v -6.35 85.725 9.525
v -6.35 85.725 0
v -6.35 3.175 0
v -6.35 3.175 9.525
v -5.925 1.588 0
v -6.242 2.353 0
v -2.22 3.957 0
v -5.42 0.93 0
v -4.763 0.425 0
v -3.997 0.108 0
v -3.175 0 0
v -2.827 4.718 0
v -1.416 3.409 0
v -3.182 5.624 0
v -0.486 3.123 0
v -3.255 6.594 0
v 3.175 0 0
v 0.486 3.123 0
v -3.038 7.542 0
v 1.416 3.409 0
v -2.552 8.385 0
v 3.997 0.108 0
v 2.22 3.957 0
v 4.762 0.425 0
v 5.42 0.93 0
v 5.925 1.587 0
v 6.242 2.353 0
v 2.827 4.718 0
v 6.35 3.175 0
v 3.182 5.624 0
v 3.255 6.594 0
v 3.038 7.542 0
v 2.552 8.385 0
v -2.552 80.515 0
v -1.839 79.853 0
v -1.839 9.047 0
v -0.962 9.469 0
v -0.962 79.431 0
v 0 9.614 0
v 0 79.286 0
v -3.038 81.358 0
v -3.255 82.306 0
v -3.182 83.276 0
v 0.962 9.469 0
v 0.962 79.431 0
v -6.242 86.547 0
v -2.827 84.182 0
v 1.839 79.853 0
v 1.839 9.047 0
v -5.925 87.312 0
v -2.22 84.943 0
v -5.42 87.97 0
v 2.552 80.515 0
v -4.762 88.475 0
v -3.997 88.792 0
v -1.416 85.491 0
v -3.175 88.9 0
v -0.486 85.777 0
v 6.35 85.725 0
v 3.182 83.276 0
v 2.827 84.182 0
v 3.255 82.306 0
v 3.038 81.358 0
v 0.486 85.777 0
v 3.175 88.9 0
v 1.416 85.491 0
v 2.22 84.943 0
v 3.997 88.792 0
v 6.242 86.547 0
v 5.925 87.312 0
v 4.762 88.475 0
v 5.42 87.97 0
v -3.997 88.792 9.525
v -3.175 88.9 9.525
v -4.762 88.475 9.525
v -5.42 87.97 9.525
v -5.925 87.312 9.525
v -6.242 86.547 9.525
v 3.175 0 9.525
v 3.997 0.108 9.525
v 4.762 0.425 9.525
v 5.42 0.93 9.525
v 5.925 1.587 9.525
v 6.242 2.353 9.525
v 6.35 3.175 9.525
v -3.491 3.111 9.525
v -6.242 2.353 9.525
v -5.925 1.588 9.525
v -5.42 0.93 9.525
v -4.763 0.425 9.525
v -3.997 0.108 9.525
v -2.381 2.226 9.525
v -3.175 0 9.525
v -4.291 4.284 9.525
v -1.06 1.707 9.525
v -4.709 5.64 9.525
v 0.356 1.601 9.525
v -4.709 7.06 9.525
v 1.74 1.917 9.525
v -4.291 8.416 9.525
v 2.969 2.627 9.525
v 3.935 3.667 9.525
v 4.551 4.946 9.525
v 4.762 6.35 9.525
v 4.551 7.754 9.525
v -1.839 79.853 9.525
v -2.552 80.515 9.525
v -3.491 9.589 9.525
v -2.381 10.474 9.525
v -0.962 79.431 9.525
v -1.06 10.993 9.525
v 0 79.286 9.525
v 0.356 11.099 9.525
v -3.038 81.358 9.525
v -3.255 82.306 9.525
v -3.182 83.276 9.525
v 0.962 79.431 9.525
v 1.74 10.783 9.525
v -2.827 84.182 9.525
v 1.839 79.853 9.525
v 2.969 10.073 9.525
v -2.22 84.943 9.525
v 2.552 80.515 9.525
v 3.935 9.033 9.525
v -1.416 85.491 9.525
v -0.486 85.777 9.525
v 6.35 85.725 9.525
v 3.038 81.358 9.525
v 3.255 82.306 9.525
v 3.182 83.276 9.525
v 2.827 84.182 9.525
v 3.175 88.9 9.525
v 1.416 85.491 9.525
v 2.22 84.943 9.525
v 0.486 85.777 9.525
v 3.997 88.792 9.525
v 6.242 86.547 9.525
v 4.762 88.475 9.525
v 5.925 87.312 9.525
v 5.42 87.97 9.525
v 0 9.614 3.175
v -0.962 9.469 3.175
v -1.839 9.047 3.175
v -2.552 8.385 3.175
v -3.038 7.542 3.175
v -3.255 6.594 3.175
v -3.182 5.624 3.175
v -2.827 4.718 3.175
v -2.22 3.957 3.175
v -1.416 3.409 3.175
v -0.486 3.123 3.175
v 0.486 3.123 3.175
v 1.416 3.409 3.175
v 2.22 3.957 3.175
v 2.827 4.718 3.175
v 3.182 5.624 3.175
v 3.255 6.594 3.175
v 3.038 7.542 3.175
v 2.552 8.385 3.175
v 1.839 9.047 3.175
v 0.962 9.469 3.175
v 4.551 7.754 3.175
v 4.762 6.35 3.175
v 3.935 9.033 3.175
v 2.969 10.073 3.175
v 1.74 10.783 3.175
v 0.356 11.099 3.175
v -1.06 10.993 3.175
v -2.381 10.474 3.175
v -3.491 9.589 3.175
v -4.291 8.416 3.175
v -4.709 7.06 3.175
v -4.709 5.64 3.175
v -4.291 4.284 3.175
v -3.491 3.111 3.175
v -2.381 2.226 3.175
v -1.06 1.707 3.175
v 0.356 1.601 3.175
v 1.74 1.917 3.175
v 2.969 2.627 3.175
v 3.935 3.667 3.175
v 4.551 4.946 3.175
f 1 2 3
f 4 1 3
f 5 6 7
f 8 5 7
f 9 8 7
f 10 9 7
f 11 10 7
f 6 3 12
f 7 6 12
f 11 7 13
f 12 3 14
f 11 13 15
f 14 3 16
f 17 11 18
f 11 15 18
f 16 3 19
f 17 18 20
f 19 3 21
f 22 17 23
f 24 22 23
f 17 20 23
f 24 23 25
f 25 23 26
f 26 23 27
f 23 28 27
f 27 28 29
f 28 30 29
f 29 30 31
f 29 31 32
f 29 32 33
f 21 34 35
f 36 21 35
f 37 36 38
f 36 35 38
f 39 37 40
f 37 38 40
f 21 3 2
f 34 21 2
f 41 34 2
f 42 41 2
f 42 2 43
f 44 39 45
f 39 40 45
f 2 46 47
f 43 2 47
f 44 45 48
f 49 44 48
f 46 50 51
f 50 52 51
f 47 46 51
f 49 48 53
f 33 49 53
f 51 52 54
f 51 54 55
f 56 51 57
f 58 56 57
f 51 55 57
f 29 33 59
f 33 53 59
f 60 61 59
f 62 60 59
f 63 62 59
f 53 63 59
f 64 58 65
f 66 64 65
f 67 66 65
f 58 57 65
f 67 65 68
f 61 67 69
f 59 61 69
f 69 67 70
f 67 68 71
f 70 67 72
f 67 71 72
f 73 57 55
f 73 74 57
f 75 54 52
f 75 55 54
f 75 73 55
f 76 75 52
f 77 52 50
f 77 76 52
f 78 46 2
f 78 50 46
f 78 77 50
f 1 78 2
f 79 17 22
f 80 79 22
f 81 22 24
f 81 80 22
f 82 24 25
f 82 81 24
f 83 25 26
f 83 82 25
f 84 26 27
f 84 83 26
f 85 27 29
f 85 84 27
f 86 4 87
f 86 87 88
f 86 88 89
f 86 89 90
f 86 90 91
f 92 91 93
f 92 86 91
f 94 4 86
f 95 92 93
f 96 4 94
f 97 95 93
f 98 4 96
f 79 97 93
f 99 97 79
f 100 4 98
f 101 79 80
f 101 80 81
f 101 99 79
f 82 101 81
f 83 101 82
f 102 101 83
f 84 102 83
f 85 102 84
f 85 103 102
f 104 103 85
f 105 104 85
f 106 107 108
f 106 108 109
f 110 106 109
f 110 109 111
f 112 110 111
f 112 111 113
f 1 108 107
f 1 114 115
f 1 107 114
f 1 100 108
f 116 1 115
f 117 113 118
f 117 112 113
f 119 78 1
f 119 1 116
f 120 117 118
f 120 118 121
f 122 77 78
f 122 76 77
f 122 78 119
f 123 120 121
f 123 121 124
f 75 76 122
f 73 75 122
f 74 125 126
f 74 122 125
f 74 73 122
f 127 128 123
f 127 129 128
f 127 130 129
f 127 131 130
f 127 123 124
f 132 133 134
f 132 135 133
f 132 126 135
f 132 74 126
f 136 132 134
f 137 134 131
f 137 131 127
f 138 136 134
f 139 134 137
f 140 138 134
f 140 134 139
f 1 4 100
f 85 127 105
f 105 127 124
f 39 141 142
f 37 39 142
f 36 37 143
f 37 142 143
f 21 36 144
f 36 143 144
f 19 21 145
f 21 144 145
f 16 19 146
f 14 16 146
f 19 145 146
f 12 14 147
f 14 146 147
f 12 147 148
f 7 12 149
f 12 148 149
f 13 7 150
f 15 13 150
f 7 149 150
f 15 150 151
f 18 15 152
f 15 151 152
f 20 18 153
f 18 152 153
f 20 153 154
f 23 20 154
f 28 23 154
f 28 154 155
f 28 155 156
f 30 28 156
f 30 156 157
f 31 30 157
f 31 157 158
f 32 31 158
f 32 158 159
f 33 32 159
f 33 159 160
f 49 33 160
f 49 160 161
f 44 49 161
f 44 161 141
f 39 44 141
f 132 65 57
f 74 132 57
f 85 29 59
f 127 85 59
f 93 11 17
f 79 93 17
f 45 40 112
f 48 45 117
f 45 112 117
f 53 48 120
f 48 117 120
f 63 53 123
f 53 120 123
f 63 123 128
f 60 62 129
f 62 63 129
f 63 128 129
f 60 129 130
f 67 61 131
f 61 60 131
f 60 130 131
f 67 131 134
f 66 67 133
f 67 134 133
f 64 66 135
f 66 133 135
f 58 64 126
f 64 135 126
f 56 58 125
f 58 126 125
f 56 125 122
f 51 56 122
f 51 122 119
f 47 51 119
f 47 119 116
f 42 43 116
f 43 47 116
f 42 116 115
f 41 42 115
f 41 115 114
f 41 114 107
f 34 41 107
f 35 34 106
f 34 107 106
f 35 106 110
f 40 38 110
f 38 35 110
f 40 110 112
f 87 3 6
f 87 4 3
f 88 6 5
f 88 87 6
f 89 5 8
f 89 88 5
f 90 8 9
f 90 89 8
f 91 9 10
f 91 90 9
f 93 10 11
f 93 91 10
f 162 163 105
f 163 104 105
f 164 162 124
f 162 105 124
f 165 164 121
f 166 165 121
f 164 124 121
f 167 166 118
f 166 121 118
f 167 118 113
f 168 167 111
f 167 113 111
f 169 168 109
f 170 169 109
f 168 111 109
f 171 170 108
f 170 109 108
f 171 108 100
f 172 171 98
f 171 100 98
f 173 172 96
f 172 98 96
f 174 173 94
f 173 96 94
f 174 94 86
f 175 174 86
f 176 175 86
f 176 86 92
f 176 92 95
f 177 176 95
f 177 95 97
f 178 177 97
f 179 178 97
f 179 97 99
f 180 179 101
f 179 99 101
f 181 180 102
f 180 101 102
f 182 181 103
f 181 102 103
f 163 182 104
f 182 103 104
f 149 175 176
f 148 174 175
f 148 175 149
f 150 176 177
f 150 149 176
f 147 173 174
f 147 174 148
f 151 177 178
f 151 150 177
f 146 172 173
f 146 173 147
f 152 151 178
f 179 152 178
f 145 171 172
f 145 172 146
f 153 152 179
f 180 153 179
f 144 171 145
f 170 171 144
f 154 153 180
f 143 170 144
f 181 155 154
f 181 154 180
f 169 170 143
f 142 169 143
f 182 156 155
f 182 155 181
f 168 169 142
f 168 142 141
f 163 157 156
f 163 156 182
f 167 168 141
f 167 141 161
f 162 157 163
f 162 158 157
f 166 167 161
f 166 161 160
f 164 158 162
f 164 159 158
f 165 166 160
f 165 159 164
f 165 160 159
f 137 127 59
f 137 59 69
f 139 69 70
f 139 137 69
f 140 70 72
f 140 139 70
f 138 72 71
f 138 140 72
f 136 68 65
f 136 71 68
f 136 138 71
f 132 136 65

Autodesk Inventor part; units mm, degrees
ref_plane "YZ Plane" through (0, 0, 0) normal (1, 0, 0) x (0, 1, 0)
ref_plane "XZ Plane" through (0, 0, 0) normal (0, 1, 0) x (-1, 0, 0)
sketch "Sketch1" plane through (0, 0, 0) normal (0, 0, 1) x (1, 0, 0)
  line L0 (-6.35, 0) -> (6.35, 0)
  line L1 (6.35, 0) -> (6.35, 88.9)
  line L2 (6.35, 88.9) -> (-6.35, 88.9)
  line L3 (-6.35, 88.9) -> (-6.35, 0)
  point P0 (0, 0)
  dimension "d6" = 88.9
  dimension "d7" = 12.7
  dimension "d22" = 6.35
extrude "Extrusion3" add sketch "Sketch1" along normal blind 9.525
sketch "Sketch4" plane through (0, 0, 0) normal (0, 0, -1) x (-1, 0, 0)
  line L0 (6.35, 0) -> (-6.35, 0) projected
  line L1 (-6.35, 0) -> (-6.35, 88.9) projected
  point P0 (0, 0)
  point P1 (0, 6.35)
  dimension "d13" = 6.35
  dimension "d14" = 6.35
hole "Hole1" at (0, 6.35, 0) direction (0, 0, 1) diameter 6.5278 end through all
sketch "Sketch5" plane through (0, 0, 9.525) normal (0, 0, 1) x (1, 0, 0)
  line L0 (-6.35, 88.9) -> (-6.35, 0) projected
  line L1 (-6.35, 44.45) -> (6.35, 44.45) construction
  line L2 (6.35, 0) -> (6.35, 88.9) projected
  point P0 (0, 0)
ref_plane "Work Plane1" through (-6.35, 44.45, 9.525) normal (0, -1, 0) x (1, 0, 0)
mirror "Mirror1" about plane through (-6.35, 44.45, 9.525) normal (0, -1, 0) of "Hole1"
fillet "Fillet1" radius 3.175 4 edges at (-6.35, 88.9, 4.7625) (6.35, 88.9, 4.7625) (6.35, 0, 4.7625) (-6.35, 0, 4.7625)
sketch "Sketch6" plane through (0, 0, 9.525) normal (0, 0, 1) x (1, 0, 0)
  circle A0 centre (0, 6.35) radius 3.2639 projected
  circle A1 centre (0, 6.35) radius 4.7625
  point P0 (0, 0)
  dimension "d25" = 9.525
extrude "Extrusion4" cut sketch "Sketch6" against normal blind 6.35
properties part number "Arm" material "Aluminum 6061"
